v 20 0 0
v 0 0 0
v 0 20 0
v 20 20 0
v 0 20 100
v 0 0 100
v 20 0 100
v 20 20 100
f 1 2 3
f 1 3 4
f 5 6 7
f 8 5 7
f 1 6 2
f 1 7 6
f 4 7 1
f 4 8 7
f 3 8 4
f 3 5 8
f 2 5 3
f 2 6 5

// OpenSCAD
$fn = 64;

size = 20.0;      // mm
length = 100.0;   // mm

linear_extrude(height = length, center = false, convexity = 10)
    square([size, size], center = false);
